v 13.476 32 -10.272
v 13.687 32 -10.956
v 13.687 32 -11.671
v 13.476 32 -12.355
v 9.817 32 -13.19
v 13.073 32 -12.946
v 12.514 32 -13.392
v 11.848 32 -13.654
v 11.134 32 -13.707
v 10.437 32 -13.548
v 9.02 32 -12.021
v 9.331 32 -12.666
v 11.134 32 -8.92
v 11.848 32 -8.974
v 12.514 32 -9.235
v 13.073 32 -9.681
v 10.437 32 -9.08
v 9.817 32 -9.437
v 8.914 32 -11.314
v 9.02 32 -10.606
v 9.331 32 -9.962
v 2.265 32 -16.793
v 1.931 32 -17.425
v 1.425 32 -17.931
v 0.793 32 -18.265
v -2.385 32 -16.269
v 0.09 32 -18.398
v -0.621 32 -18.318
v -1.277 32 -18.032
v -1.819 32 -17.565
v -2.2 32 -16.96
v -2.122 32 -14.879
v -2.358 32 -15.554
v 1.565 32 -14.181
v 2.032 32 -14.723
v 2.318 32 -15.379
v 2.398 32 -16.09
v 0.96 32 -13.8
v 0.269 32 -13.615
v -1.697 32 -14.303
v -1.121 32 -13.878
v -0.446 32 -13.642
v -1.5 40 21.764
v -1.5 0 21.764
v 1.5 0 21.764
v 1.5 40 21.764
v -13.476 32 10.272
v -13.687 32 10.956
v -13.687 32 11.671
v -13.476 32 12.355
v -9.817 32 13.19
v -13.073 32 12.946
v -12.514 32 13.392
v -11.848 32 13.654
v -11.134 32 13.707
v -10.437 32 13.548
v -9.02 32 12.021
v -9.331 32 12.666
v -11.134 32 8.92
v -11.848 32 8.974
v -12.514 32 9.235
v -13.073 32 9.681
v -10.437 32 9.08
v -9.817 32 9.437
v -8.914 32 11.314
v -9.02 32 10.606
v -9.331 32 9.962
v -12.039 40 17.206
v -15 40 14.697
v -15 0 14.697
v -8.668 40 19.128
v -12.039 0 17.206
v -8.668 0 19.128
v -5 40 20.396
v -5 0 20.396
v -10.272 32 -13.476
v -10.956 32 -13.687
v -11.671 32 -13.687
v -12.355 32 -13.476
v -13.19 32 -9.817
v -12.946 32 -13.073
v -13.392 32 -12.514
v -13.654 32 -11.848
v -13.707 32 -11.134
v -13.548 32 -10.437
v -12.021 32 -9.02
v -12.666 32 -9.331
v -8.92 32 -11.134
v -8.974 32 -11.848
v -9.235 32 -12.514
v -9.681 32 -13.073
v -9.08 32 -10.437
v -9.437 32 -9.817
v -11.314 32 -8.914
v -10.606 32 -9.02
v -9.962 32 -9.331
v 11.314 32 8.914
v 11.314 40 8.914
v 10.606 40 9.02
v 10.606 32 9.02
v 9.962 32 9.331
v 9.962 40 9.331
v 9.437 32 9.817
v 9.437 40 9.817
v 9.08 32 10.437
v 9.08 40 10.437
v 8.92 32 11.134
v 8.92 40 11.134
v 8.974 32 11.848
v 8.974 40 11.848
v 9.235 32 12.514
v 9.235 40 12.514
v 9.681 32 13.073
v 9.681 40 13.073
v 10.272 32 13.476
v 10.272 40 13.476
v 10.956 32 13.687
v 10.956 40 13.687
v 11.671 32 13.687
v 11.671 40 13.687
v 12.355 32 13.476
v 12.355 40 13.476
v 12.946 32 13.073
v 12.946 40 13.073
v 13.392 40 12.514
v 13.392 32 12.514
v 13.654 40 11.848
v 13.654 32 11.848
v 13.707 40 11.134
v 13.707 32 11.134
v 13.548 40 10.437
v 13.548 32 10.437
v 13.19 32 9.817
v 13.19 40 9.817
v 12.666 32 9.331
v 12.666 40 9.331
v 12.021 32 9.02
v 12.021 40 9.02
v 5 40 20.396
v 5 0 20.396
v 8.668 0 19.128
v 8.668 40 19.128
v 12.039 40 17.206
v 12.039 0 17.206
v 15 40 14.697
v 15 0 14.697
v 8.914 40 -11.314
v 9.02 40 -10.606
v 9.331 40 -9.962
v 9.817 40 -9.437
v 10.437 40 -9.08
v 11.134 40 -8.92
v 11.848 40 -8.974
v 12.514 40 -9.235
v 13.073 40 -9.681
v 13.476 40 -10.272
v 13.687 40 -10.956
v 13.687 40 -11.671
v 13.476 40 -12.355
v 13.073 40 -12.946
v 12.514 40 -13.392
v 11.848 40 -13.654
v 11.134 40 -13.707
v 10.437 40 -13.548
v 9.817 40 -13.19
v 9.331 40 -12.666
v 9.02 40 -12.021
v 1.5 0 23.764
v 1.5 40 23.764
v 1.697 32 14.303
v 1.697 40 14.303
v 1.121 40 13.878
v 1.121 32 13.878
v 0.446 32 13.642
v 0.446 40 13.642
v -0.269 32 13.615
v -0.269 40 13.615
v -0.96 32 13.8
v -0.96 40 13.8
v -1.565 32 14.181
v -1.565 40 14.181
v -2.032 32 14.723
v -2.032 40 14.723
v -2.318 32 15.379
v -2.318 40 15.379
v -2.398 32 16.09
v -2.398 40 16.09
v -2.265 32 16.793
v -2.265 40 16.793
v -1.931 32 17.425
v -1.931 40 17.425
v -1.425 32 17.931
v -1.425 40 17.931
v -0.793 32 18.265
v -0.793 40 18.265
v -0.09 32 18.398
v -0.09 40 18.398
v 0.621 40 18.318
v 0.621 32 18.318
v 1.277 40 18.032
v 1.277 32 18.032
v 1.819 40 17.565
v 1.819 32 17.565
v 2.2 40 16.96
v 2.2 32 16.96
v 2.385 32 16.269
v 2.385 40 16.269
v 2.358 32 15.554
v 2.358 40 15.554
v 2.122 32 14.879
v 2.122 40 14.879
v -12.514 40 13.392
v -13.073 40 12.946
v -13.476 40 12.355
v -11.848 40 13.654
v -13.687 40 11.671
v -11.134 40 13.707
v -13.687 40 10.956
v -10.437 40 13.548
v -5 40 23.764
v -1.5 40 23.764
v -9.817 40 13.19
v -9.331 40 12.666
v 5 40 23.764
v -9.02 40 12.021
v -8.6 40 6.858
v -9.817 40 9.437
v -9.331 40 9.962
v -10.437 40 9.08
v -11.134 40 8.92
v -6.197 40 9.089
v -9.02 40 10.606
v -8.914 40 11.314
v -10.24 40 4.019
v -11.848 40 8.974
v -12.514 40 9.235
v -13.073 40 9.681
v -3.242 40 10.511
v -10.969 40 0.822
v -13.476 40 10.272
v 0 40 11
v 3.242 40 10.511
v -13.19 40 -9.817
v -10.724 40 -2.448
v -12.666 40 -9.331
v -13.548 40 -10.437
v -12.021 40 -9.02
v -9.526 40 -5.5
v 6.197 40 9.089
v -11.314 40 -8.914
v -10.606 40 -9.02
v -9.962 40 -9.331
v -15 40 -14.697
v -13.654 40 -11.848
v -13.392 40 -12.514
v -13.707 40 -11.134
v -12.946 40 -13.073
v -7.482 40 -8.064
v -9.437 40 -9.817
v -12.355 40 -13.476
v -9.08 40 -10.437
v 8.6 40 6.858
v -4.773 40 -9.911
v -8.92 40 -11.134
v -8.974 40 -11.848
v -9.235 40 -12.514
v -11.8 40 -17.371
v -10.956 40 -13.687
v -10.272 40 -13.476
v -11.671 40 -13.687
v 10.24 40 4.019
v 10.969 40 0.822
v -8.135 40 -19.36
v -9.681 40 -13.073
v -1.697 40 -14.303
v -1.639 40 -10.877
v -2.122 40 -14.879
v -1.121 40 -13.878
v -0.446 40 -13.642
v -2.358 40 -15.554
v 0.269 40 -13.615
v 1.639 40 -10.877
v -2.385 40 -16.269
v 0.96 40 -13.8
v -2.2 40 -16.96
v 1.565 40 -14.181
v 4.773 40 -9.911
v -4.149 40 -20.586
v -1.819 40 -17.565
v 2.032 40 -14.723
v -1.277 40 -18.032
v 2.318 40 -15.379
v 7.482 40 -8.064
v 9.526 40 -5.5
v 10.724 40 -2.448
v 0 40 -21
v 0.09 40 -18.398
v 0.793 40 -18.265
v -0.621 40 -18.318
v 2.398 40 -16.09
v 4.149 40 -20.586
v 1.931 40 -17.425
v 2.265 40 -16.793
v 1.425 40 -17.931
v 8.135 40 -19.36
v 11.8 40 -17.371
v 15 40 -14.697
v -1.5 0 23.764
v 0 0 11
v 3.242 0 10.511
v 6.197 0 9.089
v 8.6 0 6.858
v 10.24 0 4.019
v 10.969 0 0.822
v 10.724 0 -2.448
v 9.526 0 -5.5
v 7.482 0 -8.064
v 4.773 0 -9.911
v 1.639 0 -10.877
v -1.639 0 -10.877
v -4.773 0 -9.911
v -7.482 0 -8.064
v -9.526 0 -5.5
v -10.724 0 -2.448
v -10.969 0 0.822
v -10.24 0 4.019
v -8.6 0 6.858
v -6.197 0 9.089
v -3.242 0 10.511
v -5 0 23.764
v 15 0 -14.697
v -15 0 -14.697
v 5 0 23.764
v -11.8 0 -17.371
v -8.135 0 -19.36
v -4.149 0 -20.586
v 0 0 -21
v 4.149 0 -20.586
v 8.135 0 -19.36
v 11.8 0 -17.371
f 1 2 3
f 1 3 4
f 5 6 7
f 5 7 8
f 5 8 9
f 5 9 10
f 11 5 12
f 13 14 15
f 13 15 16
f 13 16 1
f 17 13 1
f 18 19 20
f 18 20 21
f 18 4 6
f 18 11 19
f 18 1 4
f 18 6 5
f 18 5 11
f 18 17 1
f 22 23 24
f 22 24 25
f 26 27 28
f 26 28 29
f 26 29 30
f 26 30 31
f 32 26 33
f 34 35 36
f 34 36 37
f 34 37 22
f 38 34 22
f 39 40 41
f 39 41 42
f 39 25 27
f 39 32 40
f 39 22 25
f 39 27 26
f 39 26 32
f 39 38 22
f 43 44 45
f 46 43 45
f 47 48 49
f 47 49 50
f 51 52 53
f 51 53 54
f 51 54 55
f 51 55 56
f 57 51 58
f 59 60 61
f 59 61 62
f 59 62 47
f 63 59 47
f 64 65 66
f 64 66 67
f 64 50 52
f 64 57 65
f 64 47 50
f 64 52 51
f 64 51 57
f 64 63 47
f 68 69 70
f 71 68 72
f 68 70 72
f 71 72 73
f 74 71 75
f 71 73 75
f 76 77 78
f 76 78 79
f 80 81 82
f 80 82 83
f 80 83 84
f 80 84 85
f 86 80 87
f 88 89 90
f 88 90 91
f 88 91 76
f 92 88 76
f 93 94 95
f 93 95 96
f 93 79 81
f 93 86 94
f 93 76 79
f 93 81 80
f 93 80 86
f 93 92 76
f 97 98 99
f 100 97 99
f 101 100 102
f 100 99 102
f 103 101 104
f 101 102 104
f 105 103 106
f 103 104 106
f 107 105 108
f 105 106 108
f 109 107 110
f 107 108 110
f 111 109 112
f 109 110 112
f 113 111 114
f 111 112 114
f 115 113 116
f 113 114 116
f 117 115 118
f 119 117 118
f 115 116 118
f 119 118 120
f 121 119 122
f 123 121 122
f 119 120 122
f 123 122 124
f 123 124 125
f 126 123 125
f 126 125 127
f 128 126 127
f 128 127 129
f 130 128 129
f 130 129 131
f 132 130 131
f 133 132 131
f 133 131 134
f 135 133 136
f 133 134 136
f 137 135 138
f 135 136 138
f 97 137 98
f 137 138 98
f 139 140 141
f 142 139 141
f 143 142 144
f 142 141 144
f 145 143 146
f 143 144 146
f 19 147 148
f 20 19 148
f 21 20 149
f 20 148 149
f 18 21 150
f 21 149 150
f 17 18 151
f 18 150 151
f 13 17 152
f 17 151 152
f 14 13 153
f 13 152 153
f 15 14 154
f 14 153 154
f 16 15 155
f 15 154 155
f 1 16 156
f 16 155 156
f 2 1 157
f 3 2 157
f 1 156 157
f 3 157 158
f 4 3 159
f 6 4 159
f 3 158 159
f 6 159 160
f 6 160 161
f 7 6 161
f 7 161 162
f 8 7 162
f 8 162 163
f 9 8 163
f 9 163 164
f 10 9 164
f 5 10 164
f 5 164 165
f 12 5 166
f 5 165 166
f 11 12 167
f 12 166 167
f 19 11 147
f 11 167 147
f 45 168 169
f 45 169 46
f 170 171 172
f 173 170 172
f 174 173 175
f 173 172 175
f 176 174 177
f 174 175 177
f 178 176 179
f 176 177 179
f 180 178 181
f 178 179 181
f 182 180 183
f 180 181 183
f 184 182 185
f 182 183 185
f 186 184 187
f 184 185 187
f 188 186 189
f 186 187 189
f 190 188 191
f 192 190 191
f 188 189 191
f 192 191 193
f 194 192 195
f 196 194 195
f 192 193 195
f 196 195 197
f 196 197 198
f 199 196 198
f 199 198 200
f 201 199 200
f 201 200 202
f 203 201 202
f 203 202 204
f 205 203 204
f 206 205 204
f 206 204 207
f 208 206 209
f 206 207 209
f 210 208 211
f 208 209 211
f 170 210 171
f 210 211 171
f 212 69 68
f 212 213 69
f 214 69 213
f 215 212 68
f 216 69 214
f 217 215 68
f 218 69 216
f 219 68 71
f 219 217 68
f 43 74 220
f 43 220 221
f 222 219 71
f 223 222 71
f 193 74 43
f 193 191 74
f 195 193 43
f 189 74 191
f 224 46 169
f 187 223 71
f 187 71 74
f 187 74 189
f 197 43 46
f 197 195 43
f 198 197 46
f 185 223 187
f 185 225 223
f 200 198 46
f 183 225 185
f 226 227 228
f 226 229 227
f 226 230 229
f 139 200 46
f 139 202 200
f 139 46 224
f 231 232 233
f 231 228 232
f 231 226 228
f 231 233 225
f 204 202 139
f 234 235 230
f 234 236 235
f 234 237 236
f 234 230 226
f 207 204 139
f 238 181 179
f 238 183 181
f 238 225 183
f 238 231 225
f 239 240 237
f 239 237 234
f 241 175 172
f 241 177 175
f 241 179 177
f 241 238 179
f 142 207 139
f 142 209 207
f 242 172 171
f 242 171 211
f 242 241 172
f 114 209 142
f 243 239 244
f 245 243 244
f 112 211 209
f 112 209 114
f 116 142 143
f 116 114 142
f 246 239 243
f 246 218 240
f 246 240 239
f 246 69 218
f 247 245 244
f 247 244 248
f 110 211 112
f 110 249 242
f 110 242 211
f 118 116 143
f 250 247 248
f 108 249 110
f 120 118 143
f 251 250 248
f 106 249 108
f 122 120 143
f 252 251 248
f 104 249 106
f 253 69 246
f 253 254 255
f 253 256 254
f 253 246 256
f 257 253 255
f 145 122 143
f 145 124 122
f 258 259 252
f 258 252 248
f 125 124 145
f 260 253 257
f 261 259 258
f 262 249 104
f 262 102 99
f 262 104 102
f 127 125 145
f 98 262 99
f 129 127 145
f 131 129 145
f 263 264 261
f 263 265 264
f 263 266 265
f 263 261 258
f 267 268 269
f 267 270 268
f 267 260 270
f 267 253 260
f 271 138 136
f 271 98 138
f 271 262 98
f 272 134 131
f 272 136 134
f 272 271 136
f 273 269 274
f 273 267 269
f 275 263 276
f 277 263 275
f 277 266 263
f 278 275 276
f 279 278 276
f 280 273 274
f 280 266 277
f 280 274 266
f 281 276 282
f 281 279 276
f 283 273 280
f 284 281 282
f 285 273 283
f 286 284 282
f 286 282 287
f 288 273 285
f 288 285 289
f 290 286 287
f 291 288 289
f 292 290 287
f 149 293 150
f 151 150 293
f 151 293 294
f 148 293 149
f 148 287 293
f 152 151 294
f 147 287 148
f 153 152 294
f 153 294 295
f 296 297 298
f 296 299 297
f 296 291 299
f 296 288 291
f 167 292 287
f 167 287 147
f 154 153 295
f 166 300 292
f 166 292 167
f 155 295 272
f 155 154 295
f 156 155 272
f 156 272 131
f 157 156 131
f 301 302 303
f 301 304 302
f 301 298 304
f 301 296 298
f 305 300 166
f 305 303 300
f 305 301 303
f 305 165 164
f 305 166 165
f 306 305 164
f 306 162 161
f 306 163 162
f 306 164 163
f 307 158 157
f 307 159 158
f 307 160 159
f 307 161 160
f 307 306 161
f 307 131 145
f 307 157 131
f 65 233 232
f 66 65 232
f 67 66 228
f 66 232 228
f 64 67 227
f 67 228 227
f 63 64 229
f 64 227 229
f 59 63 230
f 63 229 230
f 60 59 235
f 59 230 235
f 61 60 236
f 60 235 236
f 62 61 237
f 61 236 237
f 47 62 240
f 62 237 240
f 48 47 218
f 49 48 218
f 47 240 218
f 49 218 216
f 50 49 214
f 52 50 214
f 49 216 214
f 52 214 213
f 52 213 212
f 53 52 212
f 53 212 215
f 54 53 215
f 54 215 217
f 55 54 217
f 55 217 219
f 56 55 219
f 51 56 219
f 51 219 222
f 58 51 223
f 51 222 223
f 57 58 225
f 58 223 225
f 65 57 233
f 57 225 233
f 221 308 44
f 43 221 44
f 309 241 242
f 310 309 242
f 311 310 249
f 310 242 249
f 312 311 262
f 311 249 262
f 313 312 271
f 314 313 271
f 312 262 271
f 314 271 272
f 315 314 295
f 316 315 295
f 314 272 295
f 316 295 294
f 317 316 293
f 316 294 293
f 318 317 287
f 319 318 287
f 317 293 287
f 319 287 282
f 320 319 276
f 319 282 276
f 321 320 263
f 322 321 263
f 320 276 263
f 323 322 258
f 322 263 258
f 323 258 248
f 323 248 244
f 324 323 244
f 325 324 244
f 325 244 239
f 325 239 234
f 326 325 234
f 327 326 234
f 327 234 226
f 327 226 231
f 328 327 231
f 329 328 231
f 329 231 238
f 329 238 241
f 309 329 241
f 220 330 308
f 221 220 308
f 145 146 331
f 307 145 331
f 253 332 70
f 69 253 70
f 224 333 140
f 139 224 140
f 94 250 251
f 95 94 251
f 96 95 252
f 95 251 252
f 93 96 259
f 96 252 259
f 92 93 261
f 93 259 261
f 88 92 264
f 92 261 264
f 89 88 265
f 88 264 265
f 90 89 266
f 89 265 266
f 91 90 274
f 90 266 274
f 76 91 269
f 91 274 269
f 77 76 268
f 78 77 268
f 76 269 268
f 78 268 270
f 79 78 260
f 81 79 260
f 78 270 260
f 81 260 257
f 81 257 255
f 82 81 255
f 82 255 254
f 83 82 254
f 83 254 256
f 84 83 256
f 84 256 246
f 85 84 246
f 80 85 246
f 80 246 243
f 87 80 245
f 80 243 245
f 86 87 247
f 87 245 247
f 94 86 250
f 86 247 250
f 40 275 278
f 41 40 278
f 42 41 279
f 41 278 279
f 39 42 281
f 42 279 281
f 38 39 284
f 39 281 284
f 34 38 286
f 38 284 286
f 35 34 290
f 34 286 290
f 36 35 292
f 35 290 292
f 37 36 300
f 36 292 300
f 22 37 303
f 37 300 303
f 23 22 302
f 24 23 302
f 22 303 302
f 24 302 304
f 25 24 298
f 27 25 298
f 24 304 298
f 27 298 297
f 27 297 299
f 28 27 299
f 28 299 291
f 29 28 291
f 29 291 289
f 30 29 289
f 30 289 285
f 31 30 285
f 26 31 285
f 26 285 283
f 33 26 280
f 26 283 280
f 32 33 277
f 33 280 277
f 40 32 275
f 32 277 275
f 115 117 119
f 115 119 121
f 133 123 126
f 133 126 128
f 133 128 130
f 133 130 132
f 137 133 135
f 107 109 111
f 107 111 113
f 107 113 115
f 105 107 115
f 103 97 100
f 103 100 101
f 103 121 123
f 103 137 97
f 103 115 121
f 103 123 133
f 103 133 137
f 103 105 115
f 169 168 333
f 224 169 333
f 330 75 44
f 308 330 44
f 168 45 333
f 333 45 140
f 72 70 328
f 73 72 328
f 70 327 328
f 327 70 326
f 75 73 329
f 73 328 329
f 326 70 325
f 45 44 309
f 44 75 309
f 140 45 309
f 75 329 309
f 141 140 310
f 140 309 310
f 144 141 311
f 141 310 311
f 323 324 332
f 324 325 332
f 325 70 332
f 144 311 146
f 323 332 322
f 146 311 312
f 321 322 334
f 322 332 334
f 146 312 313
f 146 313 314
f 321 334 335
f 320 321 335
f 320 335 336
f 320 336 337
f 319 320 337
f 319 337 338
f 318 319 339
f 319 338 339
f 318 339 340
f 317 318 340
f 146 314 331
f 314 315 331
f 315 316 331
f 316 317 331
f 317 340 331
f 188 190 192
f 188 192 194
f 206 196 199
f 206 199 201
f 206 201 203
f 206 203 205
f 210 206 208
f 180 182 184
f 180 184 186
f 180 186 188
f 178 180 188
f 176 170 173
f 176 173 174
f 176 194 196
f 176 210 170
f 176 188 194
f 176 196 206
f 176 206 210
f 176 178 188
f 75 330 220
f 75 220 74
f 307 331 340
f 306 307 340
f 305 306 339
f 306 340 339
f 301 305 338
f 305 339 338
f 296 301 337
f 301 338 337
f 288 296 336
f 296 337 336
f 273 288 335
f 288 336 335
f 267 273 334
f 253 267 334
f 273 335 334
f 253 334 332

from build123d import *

# Parameters (mm, degrees)
EXTRUDE_1_DEPTH          = 40
SKETCH_2_R               = 11
CUT_EXTRUDE_1_DEPTH      = 48.602520942
SKETCH_3_R               = 2.4
CUT_EXTRUDE_2_DEPTH      = 8
PATTERN_CIRCULAR_2_COUNT = 8
SKETCH_4_W               = 10
SKETCH_4_H               = 3.367948213
EXTRUDE_2_DEPTH          = 40
SKETCH_5_W               = 3
SKETCH_5_H               = 2
CUT_EXTRUDE_3_DEPTH      = 49.884853937


with BuildPart() as part:
    # 草图1 → 凸台-拉伸1 (new body)
    with BuildSketch(Plane(origin=(0, 0, 0), x_dir=(1, 0, 0), z_dir=(0, 1, 0))):
        with BuildLine():
            Line((-15, 14.696938457), (-15, -14.696938457))
            ThreePointArc((-15, -14.696938457), (0, -21), (15, -14.696938457))
            Line((15, -14.696938457), (15, 14.696938457))
            ThreePointArc((15, 14.696938457), (0, 21), (-15, 14.696938457))
        make_face()
    extrude(amount=EXTRUDE_1_DEPTH)

    # 草图2 → 切除-拉伸1 (cut, through all)
    with BuildSketch(Plane(origin=(0, 40, 0), x_dir=(1, 0, 0), z_dir=(0, 1, 0))):
        with Locations(Location((0, 0, 0), (0, 0, 270))):
            Circle(SKETCH_2_R)
    extrude(amount=-CUT_EXTRUDE_1_DEPTH, mode=Mode.SUBTRACT)

    # 草图3 → 切除-拉伸2 (cut)
    with BuildSketch(Plane(origin=(0, 40, 0), x_dir=(1, 0, 0), z_dir=(0, 1, 0))):
        with Locations(Location((-11.313708499, 11.313708499, 0), (0, 0, 270))):
            Circle(SKETCH_3_R)
    cut_extrude_2 = extrude(amount=-CUT_EXTRUDE_2_DEPTH, mode=Mode.SUBTRACT)

    # 阵列(圆周)2: 切除-拉伸2 ×8 about axis, 2 skipped
    pattern_circular_2_axis = Axis((0, 40, 0), (0, 1, 0))
    add([cut_extrude_2.rotate(pattern_circular_2_axis, i * 360 / PATTERN_CIRCULAR_2_COUNT) for i in range(1, PATTERN_CIRCULAR_2_COUNT) if i not in (1, 5)], mode=Mode.SUBTRACT)

    # 草图4 → 凸台-拉伸2 (add)
    with BuildSketch(Plane(origin=(0, 0, 0), x_dir=(1, 0, 0), z_dir=(0, 1, 0))):
        with Locations((0, -22.080052161)):
            Rectangle(SKETCH_4_W, SKETCH_4_H)
    extrude(amount=EXTRUDE_2_DEPTH)

    # 草图5 → 切除-拉伸3 (cut, through all)
    with BuildSketch(Plane(origin=(0, 0, 0), x_dir=(1, 0, 0), z_dir=(0, 1, 0))):
        with Locations((0, -22.764026267)):
            Rectangle(SKETCH_5_W, SKETCH_5_H)
    extrude(amount=CUT_EXTRUDE_3_DEPTH, mode=Mode.SUBTRACT)


solid = part.part
